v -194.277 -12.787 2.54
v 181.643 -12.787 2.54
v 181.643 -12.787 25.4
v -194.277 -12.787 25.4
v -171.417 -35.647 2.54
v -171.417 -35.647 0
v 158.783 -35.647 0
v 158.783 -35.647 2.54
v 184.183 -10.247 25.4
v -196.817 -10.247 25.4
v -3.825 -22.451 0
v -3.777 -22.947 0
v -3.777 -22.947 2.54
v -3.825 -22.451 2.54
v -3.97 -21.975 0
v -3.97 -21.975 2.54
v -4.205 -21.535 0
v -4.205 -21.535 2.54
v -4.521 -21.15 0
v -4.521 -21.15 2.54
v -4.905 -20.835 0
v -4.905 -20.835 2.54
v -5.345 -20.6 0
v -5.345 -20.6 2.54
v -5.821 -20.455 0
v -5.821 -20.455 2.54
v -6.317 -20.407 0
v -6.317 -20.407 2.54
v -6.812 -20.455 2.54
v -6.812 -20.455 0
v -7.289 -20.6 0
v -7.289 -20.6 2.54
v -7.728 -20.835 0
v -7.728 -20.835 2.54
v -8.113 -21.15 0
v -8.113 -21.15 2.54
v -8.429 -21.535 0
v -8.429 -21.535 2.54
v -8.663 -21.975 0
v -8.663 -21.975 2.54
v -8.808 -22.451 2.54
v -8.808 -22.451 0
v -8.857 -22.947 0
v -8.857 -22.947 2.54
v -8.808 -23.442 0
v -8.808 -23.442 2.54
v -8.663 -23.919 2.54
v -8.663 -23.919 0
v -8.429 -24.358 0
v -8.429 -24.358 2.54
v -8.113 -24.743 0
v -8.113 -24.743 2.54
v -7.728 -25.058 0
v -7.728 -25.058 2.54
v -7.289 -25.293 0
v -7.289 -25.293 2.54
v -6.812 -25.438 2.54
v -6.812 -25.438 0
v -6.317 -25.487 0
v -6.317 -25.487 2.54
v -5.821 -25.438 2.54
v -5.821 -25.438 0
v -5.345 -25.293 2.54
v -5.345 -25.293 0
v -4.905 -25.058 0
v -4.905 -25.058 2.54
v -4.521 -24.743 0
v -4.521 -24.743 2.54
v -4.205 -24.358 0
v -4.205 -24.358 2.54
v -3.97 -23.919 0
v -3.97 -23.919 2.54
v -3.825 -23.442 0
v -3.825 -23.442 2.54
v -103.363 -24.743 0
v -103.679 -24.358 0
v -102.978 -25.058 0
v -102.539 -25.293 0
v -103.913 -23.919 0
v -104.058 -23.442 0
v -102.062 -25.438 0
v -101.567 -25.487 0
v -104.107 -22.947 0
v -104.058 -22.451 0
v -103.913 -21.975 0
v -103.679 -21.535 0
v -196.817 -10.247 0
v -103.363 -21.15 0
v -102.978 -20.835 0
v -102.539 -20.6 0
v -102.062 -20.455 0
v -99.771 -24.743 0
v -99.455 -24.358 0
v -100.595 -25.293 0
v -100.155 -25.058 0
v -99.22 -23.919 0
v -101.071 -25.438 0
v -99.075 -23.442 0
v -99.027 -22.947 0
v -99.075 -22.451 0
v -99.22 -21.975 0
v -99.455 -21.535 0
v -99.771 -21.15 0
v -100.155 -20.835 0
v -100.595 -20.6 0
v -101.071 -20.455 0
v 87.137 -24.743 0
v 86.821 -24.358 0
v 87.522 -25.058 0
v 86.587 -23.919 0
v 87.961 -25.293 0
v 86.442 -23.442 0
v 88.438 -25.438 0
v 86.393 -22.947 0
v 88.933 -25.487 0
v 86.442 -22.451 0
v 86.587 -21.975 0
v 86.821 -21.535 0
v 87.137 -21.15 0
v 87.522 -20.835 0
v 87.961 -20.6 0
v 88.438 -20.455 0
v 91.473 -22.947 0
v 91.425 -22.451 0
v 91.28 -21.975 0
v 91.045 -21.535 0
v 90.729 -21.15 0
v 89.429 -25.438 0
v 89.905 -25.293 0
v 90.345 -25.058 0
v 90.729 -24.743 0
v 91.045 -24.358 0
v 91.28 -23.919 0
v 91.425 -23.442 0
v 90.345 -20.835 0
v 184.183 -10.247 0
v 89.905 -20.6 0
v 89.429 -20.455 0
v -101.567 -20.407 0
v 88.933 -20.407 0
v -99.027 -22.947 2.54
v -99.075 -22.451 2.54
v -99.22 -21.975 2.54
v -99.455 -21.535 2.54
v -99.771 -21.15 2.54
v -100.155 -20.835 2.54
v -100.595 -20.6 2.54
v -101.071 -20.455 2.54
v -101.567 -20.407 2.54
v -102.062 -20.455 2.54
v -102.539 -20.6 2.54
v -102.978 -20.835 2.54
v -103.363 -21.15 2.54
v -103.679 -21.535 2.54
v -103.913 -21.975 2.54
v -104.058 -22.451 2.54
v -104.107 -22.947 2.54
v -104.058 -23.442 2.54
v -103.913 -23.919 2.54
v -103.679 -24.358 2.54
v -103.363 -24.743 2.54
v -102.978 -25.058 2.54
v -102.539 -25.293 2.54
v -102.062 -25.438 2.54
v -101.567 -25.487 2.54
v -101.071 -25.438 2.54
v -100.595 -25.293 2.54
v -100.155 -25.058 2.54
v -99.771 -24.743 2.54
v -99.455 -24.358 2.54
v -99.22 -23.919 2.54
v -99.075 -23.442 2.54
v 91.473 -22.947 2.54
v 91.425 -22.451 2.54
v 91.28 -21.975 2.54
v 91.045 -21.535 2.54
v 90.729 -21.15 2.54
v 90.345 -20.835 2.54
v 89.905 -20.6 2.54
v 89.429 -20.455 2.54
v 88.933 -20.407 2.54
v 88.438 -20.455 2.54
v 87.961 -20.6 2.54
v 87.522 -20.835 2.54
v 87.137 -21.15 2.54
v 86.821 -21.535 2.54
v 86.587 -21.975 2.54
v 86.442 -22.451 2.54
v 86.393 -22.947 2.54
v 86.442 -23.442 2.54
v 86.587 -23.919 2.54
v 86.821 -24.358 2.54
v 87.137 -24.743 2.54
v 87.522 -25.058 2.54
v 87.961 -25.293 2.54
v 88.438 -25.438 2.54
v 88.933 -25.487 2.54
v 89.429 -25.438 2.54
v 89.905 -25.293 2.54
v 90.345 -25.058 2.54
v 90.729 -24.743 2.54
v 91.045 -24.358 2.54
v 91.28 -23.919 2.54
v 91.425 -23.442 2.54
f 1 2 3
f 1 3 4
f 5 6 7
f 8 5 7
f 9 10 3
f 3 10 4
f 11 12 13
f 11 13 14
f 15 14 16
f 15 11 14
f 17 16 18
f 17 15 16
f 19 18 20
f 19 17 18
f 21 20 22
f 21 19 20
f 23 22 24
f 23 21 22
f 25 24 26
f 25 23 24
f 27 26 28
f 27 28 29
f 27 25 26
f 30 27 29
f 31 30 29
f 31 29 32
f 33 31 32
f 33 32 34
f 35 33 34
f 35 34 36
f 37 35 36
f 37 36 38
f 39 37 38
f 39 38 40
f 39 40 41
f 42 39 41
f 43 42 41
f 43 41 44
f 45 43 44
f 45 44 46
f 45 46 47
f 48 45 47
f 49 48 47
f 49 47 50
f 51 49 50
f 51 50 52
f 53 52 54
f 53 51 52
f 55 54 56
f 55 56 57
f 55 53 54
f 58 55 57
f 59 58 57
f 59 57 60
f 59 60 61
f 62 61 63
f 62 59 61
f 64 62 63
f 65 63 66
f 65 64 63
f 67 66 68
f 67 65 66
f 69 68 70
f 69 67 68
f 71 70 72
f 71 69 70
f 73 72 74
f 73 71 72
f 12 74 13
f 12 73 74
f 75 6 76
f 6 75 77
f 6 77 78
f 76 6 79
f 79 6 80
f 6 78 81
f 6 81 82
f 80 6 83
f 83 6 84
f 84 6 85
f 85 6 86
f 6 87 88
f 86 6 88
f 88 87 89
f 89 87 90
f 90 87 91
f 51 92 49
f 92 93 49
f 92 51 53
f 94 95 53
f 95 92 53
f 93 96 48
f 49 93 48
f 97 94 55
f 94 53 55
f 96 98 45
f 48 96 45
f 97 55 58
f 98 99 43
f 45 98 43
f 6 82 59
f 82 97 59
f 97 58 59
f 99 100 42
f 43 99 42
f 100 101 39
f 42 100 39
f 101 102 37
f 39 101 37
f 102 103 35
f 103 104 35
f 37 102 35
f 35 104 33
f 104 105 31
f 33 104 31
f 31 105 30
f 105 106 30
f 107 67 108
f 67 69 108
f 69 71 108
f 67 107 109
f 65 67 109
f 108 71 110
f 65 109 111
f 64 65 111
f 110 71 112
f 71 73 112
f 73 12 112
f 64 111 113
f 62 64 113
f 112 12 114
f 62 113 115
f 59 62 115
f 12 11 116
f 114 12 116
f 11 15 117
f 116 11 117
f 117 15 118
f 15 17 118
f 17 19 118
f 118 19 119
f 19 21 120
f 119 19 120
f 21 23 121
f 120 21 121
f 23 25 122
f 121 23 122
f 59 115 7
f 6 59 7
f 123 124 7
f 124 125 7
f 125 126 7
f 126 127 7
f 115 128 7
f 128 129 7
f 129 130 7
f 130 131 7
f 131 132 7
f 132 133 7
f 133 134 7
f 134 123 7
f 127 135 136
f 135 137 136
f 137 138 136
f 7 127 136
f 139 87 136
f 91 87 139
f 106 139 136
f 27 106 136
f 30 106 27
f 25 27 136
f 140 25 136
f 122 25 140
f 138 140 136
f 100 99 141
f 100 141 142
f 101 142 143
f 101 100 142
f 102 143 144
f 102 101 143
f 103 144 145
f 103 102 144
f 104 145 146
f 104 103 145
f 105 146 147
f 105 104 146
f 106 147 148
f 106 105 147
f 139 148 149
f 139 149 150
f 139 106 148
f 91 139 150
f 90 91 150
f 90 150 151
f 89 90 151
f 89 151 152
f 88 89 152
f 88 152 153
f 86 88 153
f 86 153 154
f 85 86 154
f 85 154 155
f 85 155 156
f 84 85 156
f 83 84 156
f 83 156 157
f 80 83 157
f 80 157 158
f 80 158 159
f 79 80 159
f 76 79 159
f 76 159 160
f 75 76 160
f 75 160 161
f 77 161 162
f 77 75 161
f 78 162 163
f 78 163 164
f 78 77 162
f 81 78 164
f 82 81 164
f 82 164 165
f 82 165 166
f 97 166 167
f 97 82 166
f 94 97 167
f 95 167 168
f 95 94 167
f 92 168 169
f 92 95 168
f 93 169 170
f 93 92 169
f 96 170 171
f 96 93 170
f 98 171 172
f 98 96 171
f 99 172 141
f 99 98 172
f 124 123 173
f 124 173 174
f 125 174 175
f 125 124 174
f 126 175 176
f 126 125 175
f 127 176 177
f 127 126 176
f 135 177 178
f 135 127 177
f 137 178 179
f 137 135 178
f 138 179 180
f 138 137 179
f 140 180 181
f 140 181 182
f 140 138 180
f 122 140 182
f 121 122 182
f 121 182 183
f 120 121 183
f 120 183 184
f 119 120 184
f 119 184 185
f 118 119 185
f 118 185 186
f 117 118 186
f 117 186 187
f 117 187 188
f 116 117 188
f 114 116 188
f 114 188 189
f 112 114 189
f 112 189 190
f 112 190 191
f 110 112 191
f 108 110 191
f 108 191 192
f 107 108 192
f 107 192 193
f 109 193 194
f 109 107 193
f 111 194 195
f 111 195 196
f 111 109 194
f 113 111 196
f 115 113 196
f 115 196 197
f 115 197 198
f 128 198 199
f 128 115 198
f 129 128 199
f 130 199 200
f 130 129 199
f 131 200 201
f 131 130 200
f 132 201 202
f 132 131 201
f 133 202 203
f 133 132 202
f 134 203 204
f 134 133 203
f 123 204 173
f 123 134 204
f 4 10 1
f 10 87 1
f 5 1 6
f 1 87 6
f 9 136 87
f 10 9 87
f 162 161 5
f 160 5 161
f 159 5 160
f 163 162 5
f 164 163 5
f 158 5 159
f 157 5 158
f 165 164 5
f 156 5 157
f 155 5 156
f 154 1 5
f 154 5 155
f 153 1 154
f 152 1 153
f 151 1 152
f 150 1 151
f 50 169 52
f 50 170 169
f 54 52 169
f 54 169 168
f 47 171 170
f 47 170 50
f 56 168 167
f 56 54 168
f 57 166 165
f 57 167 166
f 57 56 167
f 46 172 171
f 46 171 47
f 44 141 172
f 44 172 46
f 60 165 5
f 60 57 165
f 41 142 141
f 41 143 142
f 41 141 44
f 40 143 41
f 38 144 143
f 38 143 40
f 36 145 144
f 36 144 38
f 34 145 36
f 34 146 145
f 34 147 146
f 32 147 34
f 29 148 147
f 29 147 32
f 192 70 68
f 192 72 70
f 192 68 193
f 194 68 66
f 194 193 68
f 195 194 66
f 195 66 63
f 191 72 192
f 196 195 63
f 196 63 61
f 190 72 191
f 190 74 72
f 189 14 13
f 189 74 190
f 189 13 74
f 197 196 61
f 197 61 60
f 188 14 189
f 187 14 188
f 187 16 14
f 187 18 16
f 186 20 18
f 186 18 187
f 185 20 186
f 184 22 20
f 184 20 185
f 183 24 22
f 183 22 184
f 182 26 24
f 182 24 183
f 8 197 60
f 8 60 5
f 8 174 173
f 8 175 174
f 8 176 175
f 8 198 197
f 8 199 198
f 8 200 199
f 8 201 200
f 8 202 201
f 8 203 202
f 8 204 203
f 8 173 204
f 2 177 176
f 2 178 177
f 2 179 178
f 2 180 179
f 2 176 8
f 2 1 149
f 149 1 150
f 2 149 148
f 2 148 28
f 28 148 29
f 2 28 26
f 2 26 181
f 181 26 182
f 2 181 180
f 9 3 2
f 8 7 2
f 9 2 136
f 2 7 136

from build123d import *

# Parameters (mm, degrees)
F0_R     = 2.54
F1_DEPTH = 25.4
F2_T     = -2.54


with BuildPart() as f1:
    # F0 (on Top) → F1 (new body)
    with BuildSketch(Plane.XY):
        Polygon((184.18342, -10.24653), (-196.81658, -10.24653), (-171.41658, -35.64653), (158.78342, -35.64653), align=None)
        with Locations((-101.56658, -22.94653)):
            Circle(F0_R, mode=Mode.SUBTRACT)
        with Locations((-6.31658, -22.94653)):
            Circle(F0_R, mode=Mode.SUBTRACT)
        with Locations((88.93342, -22.94653)):
            Circle(F0_R, mode=Mode.SUBTRACT)
    extrude(amount=F1_DEPTH)

    # F2
    f2_openings = [f1.faces().sort_by_distance(p)[0] for p in [
        (-104.10658, -22.94653, 12.7),
        (-8.85658, -22.94653, 12.7),
        (86.39342, -22.94653, 12.7),
        (-184.11658, -22.94653, 12.7),
        (171.48342, -22.94653, 12.7),
        (-6.31658, -35.64653, 12.7),
        (168.783363, -20.246473, 25.4),
    ]]
    offset(amount=F2_T, openings=f2_openings)


solid = f1.part
